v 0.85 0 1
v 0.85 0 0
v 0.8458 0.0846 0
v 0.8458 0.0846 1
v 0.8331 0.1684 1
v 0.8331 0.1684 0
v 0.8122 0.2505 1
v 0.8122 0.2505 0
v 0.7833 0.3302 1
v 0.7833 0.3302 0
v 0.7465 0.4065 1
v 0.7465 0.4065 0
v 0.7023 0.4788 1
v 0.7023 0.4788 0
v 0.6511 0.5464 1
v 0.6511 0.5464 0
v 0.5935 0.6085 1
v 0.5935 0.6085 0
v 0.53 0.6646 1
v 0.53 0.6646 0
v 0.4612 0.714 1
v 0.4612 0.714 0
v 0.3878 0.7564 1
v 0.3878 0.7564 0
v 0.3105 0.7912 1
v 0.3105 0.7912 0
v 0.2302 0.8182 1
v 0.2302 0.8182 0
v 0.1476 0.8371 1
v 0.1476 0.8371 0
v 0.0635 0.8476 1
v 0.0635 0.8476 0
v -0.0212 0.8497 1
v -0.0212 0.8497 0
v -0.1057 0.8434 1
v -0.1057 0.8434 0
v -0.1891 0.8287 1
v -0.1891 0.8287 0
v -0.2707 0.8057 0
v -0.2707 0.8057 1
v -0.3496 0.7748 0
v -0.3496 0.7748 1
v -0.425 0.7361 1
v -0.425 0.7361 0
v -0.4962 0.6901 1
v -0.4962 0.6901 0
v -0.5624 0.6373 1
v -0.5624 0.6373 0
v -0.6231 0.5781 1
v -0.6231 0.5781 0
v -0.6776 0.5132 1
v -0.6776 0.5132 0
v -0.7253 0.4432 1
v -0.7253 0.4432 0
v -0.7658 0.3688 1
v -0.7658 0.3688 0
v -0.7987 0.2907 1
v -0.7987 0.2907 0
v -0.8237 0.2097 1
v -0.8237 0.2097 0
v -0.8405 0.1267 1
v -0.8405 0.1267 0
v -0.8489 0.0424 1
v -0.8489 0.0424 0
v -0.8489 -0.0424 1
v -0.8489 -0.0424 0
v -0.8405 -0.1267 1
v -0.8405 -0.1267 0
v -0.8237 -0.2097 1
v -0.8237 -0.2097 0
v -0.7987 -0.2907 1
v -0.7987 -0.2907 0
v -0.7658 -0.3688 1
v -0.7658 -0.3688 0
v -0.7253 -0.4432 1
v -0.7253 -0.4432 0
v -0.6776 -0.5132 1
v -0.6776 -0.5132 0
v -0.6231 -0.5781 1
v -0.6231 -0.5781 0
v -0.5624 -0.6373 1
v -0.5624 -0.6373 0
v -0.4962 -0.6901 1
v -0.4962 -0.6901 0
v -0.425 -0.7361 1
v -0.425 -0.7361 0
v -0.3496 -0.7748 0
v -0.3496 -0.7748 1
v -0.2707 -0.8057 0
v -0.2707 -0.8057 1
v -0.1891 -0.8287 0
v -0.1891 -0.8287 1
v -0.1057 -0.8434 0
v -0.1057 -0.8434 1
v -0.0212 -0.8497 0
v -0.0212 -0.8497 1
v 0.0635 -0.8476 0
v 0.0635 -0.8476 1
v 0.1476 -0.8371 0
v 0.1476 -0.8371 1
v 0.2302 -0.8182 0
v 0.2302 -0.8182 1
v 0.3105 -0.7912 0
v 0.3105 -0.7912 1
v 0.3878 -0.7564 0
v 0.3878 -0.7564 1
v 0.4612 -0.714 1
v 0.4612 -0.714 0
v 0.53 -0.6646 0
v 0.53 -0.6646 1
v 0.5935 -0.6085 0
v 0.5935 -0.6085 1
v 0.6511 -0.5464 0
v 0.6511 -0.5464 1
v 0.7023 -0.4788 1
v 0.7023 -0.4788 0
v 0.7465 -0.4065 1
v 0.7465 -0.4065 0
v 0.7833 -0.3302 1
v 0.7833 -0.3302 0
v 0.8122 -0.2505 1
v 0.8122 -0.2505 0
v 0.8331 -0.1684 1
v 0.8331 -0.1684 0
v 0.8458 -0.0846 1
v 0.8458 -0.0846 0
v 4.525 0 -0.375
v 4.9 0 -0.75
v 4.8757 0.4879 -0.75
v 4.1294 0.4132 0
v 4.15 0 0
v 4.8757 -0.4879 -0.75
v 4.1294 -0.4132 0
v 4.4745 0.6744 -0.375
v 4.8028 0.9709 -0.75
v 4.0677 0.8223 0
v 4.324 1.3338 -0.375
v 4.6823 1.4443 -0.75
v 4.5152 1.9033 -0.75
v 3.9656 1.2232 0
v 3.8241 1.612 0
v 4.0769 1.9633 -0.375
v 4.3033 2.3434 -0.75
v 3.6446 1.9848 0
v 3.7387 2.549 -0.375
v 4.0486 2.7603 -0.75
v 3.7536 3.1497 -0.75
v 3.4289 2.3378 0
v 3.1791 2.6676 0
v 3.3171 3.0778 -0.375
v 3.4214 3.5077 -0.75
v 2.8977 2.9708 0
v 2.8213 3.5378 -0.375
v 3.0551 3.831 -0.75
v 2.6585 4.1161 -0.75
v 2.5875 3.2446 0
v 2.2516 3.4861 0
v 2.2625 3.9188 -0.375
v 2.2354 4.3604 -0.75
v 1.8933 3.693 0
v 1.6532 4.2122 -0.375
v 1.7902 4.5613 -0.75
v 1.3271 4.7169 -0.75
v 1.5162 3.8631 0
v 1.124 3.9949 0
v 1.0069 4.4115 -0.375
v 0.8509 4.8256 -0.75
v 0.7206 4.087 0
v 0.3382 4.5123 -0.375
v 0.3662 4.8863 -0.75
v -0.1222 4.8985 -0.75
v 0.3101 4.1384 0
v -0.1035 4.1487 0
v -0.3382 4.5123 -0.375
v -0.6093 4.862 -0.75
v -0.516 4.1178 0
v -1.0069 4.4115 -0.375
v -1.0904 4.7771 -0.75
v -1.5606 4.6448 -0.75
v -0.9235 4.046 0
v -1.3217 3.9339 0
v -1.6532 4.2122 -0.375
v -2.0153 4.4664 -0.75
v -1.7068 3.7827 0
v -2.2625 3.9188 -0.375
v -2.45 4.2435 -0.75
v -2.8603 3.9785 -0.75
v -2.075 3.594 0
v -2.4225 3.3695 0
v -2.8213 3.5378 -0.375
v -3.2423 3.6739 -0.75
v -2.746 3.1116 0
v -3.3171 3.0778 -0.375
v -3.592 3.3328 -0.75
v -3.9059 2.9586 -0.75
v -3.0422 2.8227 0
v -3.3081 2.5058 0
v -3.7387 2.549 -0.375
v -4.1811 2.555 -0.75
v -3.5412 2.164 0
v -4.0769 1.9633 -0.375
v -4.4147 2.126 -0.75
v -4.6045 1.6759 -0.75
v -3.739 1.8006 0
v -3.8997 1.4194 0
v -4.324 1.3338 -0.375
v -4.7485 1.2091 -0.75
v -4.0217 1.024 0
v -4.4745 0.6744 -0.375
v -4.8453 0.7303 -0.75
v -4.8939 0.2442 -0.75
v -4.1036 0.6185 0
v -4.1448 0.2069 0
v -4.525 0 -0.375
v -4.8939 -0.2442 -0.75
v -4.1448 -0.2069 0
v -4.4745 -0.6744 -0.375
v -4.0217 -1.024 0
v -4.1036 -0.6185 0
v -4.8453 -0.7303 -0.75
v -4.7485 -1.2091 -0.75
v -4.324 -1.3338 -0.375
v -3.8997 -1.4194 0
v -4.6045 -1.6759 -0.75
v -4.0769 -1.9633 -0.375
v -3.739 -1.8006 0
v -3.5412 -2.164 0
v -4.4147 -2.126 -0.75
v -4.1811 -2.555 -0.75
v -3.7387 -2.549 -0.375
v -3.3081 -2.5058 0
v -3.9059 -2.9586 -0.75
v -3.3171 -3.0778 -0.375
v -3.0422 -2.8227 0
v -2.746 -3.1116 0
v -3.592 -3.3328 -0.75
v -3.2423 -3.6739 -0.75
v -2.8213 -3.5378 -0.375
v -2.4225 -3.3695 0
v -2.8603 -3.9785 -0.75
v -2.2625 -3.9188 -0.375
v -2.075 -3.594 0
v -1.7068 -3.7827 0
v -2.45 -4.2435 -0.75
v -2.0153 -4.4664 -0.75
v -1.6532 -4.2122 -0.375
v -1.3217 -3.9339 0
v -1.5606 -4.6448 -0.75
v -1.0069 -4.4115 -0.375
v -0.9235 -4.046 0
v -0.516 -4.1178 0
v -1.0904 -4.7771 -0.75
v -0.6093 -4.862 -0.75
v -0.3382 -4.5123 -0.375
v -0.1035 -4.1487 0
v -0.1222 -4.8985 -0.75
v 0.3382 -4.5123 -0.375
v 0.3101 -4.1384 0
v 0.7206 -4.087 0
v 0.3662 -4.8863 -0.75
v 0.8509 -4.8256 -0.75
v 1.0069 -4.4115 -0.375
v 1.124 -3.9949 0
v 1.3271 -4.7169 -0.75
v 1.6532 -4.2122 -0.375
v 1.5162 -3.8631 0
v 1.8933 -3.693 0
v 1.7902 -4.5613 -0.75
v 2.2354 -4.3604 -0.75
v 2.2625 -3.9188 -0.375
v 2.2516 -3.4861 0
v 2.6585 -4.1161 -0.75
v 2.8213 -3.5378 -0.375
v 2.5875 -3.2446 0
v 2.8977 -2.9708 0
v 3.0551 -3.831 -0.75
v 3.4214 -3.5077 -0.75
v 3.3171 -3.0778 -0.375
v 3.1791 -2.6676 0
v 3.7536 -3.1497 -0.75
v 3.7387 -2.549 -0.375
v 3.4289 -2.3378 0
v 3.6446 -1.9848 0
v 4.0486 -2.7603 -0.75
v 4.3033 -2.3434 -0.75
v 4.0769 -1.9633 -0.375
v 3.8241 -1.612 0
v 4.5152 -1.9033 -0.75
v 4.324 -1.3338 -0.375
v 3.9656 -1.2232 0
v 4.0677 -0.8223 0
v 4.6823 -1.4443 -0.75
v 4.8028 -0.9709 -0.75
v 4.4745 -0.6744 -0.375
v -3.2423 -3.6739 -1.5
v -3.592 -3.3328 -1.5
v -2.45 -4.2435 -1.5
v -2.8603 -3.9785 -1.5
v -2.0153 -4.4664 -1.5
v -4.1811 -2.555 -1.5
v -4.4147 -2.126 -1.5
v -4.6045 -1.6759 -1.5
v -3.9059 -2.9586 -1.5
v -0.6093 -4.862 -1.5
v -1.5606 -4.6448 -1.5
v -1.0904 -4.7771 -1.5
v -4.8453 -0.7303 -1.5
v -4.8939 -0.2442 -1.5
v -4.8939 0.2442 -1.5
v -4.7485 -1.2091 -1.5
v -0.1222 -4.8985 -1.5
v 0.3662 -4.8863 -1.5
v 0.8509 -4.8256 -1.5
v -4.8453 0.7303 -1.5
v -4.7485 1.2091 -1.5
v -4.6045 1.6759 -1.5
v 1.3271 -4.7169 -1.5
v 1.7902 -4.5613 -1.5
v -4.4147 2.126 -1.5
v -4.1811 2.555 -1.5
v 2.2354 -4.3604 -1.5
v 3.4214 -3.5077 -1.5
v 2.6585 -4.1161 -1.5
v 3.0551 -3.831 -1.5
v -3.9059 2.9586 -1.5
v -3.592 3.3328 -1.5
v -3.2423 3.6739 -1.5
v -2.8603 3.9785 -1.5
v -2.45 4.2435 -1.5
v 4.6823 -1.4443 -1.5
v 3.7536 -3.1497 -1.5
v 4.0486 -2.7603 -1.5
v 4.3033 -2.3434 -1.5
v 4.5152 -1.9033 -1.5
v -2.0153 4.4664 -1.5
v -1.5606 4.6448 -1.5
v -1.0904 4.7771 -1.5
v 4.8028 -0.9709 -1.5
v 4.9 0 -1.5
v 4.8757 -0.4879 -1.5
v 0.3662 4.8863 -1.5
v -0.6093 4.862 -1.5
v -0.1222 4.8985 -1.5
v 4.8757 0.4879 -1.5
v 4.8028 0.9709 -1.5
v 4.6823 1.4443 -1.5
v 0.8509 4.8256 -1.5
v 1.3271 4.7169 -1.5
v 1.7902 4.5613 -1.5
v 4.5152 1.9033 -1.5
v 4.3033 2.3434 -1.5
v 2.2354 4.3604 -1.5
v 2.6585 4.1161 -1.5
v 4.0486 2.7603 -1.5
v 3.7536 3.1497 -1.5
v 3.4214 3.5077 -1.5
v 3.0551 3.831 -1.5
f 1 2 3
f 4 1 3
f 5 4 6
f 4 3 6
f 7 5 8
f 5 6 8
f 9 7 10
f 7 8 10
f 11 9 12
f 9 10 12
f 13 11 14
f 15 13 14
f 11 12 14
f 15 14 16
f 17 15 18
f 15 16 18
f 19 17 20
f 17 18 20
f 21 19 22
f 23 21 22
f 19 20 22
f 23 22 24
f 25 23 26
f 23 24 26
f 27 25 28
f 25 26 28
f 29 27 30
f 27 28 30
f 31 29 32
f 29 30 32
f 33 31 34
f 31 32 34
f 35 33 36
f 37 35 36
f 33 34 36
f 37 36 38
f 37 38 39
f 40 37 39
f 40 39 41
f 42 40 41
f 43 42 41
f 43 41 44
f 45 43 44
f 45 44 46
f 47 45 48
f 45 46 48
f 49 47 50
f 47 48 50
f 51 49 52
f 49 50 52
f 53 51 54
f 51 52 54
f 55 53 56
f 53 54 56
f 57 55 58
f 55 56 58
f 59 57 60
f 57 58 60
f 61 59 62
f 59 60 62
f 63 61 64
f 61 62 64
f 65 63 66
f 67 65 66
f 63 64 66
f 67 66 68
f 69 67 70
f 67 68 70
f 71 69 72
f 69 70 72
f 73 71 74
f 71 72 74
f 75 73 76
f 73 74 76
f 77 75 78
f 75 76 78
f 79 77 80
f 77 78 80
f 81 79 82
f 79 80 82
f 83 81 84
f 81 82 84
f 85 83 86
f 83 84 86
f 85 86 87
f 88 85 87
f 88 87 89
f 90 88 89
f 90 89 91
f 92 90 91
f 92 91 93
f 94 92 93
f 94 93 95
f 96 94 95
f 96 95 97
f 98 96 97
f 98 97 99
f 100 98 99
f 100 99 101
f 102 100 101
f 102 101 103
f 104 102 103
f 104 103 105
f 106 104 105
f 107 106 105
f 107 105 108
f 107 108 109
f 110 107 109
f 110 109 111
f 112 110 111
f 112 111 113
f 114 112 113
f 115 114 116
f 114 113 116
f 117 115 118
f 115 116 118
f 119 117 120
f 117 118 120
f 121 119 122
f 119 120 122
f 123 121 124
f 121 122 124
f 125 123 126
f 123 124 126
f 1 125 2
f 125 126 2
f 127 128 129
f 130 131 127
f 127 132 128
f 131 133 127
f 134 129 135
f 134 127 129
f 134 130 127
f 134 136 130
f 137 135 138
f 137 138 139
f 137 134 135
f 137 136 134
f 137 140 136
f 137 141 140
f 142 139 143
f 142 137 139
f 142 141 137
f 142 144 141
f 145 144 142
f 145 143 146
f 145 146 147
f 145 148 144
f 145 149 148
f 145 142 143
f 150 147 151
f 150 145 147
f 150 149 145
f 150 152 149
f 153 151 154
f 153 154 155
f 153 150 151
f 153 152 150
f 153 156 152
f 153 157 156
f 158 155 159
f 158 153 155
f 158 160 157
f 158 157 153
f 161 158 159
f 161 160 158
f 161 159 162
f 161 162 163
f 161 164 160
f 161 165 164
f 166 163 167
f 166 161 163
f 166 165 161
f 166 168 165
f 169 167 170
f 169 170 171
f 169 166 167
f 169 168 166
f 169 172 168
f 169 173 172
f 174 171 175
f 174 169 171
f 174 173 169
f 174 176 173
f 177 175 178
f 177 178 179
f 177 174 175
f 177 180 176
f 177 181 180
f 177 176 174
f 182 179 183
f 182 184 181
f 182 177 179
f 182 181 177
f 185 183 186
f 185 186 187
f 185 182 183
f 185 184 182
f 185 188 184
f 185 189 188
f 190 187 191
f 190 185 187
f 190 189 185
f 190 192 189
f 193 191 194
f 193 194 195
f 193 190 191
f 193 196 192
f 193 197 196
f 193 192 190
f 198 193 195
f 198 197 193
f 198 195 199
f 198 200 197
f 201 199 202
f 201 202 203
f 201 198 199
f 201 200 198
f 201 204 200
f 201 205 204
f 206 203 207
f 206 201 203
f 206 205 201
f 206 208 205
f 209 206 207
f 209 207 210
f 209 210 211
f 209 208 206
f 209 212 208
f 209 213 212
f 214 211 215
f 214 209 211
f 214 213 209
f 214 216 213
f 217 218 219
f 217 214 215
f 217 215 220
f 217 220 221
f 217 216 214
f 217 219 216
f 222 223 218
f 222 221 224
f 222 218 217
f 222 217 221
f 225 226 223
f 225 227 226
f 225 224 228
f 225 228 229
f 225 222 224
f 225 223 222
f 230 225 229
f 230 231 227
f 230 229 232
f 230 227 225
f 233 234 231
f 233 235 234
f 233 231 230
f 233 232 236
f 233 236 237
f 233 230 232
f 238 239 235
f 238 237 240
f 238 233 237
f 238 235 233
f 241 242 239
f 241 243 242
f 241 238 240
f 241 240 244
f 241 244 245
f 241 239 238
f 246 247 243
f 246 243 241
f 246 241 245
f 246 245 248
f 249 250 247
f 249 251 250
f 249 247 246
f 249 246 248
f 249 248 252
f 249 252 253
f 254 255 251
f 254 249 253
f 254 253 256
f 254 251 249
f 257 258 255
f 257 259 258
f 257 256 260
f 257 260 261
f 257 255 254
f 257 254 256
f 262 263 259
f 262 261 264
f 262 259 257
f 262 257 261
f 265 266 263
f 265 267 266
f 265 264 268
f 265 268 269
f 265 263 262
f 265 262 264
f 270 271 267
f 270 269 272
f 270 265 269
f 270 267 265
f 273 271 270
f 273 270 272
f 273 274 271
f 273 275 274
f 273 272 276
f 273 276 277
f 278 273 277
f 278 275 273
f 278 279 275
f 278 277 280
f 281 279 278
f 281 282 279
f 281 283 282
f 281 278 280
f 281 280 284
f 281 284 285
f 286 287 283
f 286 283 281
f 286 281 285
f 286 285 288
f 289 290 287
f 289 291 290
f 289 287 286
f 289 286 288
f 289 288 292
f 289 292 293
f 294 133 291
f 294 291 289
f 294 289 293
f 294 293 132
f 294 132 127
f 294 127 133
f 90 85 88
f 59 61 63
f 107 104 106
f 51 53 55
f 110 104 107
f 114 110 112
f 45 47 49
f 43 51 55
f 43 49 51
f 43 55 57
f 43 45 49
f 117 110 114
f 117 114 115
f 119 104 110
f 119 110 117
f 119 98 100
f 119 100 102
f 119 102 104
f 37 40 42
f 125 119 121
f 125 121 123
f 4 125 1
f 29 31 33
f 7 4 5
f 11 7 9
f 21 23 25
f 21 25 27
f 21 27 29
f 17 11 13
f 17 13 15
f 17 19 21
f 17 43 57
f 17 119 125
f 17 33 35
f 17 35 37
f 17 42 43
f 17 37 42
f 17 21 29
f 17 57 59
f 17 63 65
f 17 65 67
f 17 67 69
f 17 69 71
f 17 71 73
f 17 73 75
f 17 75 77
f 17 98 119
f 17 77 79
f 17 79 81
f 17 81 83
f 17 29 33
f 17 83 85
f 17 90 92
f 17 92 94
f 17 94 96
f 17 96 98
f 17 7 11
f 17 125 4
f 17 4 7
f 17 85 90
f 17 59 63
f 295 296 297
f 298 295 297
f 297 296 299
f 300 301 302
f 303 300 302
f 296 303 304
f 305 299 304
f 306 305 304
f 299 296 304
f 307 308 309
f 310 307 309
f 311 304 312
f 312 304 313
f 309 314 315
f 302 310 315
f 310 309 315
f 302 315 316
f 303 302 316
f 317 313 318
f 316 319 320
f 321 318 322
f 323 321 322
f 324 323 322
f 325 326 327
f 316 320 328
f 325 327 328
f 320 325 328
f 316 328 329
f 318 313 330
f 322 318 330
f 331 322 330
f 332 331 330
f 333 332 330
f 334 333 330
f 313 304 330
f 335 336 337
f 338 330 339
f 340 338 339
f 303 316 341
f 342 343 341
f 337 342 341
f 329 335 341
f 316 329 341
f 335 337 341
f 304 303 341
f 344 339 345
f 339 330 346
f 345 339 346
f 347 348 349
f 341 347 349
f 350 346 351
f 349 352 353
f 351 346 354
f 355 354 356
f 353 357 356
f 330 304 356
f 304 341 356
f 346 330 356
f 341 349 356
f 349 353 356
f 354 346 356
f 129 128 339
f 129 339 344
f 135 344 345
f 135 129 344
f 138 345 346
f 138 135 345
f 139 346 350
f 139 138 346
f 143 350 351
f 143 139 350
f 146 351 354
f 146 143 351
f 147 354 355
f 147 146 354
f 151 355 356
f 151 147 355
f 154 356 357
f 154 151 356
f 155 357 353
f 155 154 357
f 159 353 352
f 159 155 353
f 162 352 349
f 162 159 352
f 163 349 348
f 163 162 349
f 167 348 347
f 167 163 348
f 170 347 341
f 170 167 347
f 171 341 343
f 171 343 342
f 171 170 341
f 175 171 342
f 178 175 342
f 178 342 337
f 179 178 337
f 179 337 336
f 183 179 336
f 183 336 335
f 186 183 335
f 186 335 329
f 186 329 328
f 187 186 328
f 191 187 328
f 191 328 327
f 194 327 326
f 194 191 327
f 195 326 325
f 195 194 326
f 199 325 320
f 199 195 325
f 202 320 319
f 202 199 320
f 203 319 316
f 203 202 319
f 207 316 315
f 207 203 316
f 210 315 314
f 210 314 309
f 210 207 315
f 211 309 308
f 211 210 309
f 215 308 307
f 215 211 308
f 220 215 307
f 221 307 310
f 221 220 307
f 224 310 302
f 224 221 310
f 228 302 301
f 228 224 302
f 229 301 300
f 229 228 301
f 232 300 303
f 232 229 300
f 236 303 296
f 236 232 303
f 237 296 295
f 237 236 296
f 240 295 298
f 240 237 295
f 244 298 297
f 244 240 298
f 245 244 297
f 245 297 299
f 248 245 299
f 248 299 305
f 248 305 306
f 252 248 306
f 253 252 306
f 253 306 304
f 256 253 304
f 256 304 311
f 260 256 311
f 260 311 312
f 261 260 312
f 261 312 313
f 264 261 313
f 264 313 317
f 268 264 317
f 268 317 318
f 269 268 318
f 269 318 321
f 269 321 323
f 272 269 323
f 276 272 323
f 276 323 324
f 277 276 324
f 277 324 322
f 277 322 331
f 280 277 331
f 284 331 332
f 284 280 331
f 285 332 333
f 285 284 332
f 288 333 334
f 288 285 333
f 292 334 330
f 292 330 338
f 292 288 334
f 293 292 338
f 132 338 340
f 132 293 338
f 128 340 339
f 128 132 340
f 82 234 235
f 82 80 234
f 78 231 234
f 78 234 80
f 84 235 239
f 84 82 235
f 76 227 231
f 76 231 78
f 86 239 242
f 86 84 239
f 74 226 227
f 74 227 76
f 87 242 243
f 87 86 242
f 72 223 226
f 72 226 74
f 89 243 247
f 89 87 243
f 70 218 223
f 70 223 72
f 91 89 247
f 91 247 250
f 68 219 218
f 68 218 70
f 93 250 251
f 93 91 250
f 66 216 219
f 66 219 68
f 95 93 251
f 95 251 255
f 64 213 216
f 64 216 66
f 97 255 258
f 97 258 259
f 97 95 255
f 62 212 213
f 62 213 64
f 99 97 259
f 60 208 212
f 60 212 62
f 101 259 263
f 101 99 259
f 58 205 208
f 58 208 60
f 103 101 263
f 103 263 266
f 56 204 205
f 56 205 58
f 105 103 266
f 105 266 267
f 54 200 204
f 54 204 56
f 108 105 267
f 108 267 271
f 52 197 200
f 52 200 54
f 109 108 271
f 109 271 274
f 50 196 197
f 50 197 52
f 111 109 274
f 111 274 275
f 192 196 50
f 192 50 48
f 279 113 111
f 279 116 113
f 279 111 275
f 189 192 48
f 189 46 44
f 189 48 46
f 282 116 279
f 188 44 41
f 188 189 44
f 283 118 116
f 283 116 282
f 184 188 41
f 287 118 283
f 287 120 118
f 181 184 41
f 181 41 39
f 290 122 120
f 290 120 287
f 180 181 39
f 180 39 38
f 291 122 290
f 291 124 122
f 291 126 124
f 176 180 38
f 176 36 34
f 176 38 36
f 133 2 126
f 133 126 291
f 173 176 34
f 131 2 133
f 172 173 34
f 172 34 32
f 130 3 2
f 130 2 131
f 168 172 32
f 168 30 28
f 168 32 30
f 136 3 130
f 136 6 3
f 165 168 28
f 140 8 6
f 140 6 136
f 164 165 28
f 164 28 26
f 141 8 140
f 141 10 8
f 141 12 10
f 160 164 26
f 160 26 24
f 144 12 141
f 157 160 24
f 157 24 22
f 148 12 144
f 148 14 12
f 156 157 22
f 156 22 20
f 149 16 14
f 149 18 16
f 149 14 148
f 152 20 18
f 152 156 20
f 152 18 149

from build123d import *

# Parameters (mm, degrees)
F0_R     = 0.85
F1_DEPTH = 1
F0_R_2   = 4.9
F2_DEPTH = 1.5
F3_SIZE  = 0.75


with BuildPart() as f1:
    # F0 (on Top) → F1 (new body)
    with BuildSketch(Plane.XY):
        Circle(F0_R)
    extrude(amount=F1_DEPTH)

    # F0 (on Top) → F2 (join)
    with BuildSketch(Plane.XY):
        Circle(F0_R_2)
        Circle(F0_R, mode=Mode.SUBTRACT)
        Circle(F0_R)
    extrude(amount=-F2_DEPTH)

    # F3
    f3_edges = [f1.edges().sort_by_distance(p)[0] for p in [
        (-4.9, 0, 0),
    ]]
    chamfer(f3_edges, length=F3_SIZE)


solid = f1.part
